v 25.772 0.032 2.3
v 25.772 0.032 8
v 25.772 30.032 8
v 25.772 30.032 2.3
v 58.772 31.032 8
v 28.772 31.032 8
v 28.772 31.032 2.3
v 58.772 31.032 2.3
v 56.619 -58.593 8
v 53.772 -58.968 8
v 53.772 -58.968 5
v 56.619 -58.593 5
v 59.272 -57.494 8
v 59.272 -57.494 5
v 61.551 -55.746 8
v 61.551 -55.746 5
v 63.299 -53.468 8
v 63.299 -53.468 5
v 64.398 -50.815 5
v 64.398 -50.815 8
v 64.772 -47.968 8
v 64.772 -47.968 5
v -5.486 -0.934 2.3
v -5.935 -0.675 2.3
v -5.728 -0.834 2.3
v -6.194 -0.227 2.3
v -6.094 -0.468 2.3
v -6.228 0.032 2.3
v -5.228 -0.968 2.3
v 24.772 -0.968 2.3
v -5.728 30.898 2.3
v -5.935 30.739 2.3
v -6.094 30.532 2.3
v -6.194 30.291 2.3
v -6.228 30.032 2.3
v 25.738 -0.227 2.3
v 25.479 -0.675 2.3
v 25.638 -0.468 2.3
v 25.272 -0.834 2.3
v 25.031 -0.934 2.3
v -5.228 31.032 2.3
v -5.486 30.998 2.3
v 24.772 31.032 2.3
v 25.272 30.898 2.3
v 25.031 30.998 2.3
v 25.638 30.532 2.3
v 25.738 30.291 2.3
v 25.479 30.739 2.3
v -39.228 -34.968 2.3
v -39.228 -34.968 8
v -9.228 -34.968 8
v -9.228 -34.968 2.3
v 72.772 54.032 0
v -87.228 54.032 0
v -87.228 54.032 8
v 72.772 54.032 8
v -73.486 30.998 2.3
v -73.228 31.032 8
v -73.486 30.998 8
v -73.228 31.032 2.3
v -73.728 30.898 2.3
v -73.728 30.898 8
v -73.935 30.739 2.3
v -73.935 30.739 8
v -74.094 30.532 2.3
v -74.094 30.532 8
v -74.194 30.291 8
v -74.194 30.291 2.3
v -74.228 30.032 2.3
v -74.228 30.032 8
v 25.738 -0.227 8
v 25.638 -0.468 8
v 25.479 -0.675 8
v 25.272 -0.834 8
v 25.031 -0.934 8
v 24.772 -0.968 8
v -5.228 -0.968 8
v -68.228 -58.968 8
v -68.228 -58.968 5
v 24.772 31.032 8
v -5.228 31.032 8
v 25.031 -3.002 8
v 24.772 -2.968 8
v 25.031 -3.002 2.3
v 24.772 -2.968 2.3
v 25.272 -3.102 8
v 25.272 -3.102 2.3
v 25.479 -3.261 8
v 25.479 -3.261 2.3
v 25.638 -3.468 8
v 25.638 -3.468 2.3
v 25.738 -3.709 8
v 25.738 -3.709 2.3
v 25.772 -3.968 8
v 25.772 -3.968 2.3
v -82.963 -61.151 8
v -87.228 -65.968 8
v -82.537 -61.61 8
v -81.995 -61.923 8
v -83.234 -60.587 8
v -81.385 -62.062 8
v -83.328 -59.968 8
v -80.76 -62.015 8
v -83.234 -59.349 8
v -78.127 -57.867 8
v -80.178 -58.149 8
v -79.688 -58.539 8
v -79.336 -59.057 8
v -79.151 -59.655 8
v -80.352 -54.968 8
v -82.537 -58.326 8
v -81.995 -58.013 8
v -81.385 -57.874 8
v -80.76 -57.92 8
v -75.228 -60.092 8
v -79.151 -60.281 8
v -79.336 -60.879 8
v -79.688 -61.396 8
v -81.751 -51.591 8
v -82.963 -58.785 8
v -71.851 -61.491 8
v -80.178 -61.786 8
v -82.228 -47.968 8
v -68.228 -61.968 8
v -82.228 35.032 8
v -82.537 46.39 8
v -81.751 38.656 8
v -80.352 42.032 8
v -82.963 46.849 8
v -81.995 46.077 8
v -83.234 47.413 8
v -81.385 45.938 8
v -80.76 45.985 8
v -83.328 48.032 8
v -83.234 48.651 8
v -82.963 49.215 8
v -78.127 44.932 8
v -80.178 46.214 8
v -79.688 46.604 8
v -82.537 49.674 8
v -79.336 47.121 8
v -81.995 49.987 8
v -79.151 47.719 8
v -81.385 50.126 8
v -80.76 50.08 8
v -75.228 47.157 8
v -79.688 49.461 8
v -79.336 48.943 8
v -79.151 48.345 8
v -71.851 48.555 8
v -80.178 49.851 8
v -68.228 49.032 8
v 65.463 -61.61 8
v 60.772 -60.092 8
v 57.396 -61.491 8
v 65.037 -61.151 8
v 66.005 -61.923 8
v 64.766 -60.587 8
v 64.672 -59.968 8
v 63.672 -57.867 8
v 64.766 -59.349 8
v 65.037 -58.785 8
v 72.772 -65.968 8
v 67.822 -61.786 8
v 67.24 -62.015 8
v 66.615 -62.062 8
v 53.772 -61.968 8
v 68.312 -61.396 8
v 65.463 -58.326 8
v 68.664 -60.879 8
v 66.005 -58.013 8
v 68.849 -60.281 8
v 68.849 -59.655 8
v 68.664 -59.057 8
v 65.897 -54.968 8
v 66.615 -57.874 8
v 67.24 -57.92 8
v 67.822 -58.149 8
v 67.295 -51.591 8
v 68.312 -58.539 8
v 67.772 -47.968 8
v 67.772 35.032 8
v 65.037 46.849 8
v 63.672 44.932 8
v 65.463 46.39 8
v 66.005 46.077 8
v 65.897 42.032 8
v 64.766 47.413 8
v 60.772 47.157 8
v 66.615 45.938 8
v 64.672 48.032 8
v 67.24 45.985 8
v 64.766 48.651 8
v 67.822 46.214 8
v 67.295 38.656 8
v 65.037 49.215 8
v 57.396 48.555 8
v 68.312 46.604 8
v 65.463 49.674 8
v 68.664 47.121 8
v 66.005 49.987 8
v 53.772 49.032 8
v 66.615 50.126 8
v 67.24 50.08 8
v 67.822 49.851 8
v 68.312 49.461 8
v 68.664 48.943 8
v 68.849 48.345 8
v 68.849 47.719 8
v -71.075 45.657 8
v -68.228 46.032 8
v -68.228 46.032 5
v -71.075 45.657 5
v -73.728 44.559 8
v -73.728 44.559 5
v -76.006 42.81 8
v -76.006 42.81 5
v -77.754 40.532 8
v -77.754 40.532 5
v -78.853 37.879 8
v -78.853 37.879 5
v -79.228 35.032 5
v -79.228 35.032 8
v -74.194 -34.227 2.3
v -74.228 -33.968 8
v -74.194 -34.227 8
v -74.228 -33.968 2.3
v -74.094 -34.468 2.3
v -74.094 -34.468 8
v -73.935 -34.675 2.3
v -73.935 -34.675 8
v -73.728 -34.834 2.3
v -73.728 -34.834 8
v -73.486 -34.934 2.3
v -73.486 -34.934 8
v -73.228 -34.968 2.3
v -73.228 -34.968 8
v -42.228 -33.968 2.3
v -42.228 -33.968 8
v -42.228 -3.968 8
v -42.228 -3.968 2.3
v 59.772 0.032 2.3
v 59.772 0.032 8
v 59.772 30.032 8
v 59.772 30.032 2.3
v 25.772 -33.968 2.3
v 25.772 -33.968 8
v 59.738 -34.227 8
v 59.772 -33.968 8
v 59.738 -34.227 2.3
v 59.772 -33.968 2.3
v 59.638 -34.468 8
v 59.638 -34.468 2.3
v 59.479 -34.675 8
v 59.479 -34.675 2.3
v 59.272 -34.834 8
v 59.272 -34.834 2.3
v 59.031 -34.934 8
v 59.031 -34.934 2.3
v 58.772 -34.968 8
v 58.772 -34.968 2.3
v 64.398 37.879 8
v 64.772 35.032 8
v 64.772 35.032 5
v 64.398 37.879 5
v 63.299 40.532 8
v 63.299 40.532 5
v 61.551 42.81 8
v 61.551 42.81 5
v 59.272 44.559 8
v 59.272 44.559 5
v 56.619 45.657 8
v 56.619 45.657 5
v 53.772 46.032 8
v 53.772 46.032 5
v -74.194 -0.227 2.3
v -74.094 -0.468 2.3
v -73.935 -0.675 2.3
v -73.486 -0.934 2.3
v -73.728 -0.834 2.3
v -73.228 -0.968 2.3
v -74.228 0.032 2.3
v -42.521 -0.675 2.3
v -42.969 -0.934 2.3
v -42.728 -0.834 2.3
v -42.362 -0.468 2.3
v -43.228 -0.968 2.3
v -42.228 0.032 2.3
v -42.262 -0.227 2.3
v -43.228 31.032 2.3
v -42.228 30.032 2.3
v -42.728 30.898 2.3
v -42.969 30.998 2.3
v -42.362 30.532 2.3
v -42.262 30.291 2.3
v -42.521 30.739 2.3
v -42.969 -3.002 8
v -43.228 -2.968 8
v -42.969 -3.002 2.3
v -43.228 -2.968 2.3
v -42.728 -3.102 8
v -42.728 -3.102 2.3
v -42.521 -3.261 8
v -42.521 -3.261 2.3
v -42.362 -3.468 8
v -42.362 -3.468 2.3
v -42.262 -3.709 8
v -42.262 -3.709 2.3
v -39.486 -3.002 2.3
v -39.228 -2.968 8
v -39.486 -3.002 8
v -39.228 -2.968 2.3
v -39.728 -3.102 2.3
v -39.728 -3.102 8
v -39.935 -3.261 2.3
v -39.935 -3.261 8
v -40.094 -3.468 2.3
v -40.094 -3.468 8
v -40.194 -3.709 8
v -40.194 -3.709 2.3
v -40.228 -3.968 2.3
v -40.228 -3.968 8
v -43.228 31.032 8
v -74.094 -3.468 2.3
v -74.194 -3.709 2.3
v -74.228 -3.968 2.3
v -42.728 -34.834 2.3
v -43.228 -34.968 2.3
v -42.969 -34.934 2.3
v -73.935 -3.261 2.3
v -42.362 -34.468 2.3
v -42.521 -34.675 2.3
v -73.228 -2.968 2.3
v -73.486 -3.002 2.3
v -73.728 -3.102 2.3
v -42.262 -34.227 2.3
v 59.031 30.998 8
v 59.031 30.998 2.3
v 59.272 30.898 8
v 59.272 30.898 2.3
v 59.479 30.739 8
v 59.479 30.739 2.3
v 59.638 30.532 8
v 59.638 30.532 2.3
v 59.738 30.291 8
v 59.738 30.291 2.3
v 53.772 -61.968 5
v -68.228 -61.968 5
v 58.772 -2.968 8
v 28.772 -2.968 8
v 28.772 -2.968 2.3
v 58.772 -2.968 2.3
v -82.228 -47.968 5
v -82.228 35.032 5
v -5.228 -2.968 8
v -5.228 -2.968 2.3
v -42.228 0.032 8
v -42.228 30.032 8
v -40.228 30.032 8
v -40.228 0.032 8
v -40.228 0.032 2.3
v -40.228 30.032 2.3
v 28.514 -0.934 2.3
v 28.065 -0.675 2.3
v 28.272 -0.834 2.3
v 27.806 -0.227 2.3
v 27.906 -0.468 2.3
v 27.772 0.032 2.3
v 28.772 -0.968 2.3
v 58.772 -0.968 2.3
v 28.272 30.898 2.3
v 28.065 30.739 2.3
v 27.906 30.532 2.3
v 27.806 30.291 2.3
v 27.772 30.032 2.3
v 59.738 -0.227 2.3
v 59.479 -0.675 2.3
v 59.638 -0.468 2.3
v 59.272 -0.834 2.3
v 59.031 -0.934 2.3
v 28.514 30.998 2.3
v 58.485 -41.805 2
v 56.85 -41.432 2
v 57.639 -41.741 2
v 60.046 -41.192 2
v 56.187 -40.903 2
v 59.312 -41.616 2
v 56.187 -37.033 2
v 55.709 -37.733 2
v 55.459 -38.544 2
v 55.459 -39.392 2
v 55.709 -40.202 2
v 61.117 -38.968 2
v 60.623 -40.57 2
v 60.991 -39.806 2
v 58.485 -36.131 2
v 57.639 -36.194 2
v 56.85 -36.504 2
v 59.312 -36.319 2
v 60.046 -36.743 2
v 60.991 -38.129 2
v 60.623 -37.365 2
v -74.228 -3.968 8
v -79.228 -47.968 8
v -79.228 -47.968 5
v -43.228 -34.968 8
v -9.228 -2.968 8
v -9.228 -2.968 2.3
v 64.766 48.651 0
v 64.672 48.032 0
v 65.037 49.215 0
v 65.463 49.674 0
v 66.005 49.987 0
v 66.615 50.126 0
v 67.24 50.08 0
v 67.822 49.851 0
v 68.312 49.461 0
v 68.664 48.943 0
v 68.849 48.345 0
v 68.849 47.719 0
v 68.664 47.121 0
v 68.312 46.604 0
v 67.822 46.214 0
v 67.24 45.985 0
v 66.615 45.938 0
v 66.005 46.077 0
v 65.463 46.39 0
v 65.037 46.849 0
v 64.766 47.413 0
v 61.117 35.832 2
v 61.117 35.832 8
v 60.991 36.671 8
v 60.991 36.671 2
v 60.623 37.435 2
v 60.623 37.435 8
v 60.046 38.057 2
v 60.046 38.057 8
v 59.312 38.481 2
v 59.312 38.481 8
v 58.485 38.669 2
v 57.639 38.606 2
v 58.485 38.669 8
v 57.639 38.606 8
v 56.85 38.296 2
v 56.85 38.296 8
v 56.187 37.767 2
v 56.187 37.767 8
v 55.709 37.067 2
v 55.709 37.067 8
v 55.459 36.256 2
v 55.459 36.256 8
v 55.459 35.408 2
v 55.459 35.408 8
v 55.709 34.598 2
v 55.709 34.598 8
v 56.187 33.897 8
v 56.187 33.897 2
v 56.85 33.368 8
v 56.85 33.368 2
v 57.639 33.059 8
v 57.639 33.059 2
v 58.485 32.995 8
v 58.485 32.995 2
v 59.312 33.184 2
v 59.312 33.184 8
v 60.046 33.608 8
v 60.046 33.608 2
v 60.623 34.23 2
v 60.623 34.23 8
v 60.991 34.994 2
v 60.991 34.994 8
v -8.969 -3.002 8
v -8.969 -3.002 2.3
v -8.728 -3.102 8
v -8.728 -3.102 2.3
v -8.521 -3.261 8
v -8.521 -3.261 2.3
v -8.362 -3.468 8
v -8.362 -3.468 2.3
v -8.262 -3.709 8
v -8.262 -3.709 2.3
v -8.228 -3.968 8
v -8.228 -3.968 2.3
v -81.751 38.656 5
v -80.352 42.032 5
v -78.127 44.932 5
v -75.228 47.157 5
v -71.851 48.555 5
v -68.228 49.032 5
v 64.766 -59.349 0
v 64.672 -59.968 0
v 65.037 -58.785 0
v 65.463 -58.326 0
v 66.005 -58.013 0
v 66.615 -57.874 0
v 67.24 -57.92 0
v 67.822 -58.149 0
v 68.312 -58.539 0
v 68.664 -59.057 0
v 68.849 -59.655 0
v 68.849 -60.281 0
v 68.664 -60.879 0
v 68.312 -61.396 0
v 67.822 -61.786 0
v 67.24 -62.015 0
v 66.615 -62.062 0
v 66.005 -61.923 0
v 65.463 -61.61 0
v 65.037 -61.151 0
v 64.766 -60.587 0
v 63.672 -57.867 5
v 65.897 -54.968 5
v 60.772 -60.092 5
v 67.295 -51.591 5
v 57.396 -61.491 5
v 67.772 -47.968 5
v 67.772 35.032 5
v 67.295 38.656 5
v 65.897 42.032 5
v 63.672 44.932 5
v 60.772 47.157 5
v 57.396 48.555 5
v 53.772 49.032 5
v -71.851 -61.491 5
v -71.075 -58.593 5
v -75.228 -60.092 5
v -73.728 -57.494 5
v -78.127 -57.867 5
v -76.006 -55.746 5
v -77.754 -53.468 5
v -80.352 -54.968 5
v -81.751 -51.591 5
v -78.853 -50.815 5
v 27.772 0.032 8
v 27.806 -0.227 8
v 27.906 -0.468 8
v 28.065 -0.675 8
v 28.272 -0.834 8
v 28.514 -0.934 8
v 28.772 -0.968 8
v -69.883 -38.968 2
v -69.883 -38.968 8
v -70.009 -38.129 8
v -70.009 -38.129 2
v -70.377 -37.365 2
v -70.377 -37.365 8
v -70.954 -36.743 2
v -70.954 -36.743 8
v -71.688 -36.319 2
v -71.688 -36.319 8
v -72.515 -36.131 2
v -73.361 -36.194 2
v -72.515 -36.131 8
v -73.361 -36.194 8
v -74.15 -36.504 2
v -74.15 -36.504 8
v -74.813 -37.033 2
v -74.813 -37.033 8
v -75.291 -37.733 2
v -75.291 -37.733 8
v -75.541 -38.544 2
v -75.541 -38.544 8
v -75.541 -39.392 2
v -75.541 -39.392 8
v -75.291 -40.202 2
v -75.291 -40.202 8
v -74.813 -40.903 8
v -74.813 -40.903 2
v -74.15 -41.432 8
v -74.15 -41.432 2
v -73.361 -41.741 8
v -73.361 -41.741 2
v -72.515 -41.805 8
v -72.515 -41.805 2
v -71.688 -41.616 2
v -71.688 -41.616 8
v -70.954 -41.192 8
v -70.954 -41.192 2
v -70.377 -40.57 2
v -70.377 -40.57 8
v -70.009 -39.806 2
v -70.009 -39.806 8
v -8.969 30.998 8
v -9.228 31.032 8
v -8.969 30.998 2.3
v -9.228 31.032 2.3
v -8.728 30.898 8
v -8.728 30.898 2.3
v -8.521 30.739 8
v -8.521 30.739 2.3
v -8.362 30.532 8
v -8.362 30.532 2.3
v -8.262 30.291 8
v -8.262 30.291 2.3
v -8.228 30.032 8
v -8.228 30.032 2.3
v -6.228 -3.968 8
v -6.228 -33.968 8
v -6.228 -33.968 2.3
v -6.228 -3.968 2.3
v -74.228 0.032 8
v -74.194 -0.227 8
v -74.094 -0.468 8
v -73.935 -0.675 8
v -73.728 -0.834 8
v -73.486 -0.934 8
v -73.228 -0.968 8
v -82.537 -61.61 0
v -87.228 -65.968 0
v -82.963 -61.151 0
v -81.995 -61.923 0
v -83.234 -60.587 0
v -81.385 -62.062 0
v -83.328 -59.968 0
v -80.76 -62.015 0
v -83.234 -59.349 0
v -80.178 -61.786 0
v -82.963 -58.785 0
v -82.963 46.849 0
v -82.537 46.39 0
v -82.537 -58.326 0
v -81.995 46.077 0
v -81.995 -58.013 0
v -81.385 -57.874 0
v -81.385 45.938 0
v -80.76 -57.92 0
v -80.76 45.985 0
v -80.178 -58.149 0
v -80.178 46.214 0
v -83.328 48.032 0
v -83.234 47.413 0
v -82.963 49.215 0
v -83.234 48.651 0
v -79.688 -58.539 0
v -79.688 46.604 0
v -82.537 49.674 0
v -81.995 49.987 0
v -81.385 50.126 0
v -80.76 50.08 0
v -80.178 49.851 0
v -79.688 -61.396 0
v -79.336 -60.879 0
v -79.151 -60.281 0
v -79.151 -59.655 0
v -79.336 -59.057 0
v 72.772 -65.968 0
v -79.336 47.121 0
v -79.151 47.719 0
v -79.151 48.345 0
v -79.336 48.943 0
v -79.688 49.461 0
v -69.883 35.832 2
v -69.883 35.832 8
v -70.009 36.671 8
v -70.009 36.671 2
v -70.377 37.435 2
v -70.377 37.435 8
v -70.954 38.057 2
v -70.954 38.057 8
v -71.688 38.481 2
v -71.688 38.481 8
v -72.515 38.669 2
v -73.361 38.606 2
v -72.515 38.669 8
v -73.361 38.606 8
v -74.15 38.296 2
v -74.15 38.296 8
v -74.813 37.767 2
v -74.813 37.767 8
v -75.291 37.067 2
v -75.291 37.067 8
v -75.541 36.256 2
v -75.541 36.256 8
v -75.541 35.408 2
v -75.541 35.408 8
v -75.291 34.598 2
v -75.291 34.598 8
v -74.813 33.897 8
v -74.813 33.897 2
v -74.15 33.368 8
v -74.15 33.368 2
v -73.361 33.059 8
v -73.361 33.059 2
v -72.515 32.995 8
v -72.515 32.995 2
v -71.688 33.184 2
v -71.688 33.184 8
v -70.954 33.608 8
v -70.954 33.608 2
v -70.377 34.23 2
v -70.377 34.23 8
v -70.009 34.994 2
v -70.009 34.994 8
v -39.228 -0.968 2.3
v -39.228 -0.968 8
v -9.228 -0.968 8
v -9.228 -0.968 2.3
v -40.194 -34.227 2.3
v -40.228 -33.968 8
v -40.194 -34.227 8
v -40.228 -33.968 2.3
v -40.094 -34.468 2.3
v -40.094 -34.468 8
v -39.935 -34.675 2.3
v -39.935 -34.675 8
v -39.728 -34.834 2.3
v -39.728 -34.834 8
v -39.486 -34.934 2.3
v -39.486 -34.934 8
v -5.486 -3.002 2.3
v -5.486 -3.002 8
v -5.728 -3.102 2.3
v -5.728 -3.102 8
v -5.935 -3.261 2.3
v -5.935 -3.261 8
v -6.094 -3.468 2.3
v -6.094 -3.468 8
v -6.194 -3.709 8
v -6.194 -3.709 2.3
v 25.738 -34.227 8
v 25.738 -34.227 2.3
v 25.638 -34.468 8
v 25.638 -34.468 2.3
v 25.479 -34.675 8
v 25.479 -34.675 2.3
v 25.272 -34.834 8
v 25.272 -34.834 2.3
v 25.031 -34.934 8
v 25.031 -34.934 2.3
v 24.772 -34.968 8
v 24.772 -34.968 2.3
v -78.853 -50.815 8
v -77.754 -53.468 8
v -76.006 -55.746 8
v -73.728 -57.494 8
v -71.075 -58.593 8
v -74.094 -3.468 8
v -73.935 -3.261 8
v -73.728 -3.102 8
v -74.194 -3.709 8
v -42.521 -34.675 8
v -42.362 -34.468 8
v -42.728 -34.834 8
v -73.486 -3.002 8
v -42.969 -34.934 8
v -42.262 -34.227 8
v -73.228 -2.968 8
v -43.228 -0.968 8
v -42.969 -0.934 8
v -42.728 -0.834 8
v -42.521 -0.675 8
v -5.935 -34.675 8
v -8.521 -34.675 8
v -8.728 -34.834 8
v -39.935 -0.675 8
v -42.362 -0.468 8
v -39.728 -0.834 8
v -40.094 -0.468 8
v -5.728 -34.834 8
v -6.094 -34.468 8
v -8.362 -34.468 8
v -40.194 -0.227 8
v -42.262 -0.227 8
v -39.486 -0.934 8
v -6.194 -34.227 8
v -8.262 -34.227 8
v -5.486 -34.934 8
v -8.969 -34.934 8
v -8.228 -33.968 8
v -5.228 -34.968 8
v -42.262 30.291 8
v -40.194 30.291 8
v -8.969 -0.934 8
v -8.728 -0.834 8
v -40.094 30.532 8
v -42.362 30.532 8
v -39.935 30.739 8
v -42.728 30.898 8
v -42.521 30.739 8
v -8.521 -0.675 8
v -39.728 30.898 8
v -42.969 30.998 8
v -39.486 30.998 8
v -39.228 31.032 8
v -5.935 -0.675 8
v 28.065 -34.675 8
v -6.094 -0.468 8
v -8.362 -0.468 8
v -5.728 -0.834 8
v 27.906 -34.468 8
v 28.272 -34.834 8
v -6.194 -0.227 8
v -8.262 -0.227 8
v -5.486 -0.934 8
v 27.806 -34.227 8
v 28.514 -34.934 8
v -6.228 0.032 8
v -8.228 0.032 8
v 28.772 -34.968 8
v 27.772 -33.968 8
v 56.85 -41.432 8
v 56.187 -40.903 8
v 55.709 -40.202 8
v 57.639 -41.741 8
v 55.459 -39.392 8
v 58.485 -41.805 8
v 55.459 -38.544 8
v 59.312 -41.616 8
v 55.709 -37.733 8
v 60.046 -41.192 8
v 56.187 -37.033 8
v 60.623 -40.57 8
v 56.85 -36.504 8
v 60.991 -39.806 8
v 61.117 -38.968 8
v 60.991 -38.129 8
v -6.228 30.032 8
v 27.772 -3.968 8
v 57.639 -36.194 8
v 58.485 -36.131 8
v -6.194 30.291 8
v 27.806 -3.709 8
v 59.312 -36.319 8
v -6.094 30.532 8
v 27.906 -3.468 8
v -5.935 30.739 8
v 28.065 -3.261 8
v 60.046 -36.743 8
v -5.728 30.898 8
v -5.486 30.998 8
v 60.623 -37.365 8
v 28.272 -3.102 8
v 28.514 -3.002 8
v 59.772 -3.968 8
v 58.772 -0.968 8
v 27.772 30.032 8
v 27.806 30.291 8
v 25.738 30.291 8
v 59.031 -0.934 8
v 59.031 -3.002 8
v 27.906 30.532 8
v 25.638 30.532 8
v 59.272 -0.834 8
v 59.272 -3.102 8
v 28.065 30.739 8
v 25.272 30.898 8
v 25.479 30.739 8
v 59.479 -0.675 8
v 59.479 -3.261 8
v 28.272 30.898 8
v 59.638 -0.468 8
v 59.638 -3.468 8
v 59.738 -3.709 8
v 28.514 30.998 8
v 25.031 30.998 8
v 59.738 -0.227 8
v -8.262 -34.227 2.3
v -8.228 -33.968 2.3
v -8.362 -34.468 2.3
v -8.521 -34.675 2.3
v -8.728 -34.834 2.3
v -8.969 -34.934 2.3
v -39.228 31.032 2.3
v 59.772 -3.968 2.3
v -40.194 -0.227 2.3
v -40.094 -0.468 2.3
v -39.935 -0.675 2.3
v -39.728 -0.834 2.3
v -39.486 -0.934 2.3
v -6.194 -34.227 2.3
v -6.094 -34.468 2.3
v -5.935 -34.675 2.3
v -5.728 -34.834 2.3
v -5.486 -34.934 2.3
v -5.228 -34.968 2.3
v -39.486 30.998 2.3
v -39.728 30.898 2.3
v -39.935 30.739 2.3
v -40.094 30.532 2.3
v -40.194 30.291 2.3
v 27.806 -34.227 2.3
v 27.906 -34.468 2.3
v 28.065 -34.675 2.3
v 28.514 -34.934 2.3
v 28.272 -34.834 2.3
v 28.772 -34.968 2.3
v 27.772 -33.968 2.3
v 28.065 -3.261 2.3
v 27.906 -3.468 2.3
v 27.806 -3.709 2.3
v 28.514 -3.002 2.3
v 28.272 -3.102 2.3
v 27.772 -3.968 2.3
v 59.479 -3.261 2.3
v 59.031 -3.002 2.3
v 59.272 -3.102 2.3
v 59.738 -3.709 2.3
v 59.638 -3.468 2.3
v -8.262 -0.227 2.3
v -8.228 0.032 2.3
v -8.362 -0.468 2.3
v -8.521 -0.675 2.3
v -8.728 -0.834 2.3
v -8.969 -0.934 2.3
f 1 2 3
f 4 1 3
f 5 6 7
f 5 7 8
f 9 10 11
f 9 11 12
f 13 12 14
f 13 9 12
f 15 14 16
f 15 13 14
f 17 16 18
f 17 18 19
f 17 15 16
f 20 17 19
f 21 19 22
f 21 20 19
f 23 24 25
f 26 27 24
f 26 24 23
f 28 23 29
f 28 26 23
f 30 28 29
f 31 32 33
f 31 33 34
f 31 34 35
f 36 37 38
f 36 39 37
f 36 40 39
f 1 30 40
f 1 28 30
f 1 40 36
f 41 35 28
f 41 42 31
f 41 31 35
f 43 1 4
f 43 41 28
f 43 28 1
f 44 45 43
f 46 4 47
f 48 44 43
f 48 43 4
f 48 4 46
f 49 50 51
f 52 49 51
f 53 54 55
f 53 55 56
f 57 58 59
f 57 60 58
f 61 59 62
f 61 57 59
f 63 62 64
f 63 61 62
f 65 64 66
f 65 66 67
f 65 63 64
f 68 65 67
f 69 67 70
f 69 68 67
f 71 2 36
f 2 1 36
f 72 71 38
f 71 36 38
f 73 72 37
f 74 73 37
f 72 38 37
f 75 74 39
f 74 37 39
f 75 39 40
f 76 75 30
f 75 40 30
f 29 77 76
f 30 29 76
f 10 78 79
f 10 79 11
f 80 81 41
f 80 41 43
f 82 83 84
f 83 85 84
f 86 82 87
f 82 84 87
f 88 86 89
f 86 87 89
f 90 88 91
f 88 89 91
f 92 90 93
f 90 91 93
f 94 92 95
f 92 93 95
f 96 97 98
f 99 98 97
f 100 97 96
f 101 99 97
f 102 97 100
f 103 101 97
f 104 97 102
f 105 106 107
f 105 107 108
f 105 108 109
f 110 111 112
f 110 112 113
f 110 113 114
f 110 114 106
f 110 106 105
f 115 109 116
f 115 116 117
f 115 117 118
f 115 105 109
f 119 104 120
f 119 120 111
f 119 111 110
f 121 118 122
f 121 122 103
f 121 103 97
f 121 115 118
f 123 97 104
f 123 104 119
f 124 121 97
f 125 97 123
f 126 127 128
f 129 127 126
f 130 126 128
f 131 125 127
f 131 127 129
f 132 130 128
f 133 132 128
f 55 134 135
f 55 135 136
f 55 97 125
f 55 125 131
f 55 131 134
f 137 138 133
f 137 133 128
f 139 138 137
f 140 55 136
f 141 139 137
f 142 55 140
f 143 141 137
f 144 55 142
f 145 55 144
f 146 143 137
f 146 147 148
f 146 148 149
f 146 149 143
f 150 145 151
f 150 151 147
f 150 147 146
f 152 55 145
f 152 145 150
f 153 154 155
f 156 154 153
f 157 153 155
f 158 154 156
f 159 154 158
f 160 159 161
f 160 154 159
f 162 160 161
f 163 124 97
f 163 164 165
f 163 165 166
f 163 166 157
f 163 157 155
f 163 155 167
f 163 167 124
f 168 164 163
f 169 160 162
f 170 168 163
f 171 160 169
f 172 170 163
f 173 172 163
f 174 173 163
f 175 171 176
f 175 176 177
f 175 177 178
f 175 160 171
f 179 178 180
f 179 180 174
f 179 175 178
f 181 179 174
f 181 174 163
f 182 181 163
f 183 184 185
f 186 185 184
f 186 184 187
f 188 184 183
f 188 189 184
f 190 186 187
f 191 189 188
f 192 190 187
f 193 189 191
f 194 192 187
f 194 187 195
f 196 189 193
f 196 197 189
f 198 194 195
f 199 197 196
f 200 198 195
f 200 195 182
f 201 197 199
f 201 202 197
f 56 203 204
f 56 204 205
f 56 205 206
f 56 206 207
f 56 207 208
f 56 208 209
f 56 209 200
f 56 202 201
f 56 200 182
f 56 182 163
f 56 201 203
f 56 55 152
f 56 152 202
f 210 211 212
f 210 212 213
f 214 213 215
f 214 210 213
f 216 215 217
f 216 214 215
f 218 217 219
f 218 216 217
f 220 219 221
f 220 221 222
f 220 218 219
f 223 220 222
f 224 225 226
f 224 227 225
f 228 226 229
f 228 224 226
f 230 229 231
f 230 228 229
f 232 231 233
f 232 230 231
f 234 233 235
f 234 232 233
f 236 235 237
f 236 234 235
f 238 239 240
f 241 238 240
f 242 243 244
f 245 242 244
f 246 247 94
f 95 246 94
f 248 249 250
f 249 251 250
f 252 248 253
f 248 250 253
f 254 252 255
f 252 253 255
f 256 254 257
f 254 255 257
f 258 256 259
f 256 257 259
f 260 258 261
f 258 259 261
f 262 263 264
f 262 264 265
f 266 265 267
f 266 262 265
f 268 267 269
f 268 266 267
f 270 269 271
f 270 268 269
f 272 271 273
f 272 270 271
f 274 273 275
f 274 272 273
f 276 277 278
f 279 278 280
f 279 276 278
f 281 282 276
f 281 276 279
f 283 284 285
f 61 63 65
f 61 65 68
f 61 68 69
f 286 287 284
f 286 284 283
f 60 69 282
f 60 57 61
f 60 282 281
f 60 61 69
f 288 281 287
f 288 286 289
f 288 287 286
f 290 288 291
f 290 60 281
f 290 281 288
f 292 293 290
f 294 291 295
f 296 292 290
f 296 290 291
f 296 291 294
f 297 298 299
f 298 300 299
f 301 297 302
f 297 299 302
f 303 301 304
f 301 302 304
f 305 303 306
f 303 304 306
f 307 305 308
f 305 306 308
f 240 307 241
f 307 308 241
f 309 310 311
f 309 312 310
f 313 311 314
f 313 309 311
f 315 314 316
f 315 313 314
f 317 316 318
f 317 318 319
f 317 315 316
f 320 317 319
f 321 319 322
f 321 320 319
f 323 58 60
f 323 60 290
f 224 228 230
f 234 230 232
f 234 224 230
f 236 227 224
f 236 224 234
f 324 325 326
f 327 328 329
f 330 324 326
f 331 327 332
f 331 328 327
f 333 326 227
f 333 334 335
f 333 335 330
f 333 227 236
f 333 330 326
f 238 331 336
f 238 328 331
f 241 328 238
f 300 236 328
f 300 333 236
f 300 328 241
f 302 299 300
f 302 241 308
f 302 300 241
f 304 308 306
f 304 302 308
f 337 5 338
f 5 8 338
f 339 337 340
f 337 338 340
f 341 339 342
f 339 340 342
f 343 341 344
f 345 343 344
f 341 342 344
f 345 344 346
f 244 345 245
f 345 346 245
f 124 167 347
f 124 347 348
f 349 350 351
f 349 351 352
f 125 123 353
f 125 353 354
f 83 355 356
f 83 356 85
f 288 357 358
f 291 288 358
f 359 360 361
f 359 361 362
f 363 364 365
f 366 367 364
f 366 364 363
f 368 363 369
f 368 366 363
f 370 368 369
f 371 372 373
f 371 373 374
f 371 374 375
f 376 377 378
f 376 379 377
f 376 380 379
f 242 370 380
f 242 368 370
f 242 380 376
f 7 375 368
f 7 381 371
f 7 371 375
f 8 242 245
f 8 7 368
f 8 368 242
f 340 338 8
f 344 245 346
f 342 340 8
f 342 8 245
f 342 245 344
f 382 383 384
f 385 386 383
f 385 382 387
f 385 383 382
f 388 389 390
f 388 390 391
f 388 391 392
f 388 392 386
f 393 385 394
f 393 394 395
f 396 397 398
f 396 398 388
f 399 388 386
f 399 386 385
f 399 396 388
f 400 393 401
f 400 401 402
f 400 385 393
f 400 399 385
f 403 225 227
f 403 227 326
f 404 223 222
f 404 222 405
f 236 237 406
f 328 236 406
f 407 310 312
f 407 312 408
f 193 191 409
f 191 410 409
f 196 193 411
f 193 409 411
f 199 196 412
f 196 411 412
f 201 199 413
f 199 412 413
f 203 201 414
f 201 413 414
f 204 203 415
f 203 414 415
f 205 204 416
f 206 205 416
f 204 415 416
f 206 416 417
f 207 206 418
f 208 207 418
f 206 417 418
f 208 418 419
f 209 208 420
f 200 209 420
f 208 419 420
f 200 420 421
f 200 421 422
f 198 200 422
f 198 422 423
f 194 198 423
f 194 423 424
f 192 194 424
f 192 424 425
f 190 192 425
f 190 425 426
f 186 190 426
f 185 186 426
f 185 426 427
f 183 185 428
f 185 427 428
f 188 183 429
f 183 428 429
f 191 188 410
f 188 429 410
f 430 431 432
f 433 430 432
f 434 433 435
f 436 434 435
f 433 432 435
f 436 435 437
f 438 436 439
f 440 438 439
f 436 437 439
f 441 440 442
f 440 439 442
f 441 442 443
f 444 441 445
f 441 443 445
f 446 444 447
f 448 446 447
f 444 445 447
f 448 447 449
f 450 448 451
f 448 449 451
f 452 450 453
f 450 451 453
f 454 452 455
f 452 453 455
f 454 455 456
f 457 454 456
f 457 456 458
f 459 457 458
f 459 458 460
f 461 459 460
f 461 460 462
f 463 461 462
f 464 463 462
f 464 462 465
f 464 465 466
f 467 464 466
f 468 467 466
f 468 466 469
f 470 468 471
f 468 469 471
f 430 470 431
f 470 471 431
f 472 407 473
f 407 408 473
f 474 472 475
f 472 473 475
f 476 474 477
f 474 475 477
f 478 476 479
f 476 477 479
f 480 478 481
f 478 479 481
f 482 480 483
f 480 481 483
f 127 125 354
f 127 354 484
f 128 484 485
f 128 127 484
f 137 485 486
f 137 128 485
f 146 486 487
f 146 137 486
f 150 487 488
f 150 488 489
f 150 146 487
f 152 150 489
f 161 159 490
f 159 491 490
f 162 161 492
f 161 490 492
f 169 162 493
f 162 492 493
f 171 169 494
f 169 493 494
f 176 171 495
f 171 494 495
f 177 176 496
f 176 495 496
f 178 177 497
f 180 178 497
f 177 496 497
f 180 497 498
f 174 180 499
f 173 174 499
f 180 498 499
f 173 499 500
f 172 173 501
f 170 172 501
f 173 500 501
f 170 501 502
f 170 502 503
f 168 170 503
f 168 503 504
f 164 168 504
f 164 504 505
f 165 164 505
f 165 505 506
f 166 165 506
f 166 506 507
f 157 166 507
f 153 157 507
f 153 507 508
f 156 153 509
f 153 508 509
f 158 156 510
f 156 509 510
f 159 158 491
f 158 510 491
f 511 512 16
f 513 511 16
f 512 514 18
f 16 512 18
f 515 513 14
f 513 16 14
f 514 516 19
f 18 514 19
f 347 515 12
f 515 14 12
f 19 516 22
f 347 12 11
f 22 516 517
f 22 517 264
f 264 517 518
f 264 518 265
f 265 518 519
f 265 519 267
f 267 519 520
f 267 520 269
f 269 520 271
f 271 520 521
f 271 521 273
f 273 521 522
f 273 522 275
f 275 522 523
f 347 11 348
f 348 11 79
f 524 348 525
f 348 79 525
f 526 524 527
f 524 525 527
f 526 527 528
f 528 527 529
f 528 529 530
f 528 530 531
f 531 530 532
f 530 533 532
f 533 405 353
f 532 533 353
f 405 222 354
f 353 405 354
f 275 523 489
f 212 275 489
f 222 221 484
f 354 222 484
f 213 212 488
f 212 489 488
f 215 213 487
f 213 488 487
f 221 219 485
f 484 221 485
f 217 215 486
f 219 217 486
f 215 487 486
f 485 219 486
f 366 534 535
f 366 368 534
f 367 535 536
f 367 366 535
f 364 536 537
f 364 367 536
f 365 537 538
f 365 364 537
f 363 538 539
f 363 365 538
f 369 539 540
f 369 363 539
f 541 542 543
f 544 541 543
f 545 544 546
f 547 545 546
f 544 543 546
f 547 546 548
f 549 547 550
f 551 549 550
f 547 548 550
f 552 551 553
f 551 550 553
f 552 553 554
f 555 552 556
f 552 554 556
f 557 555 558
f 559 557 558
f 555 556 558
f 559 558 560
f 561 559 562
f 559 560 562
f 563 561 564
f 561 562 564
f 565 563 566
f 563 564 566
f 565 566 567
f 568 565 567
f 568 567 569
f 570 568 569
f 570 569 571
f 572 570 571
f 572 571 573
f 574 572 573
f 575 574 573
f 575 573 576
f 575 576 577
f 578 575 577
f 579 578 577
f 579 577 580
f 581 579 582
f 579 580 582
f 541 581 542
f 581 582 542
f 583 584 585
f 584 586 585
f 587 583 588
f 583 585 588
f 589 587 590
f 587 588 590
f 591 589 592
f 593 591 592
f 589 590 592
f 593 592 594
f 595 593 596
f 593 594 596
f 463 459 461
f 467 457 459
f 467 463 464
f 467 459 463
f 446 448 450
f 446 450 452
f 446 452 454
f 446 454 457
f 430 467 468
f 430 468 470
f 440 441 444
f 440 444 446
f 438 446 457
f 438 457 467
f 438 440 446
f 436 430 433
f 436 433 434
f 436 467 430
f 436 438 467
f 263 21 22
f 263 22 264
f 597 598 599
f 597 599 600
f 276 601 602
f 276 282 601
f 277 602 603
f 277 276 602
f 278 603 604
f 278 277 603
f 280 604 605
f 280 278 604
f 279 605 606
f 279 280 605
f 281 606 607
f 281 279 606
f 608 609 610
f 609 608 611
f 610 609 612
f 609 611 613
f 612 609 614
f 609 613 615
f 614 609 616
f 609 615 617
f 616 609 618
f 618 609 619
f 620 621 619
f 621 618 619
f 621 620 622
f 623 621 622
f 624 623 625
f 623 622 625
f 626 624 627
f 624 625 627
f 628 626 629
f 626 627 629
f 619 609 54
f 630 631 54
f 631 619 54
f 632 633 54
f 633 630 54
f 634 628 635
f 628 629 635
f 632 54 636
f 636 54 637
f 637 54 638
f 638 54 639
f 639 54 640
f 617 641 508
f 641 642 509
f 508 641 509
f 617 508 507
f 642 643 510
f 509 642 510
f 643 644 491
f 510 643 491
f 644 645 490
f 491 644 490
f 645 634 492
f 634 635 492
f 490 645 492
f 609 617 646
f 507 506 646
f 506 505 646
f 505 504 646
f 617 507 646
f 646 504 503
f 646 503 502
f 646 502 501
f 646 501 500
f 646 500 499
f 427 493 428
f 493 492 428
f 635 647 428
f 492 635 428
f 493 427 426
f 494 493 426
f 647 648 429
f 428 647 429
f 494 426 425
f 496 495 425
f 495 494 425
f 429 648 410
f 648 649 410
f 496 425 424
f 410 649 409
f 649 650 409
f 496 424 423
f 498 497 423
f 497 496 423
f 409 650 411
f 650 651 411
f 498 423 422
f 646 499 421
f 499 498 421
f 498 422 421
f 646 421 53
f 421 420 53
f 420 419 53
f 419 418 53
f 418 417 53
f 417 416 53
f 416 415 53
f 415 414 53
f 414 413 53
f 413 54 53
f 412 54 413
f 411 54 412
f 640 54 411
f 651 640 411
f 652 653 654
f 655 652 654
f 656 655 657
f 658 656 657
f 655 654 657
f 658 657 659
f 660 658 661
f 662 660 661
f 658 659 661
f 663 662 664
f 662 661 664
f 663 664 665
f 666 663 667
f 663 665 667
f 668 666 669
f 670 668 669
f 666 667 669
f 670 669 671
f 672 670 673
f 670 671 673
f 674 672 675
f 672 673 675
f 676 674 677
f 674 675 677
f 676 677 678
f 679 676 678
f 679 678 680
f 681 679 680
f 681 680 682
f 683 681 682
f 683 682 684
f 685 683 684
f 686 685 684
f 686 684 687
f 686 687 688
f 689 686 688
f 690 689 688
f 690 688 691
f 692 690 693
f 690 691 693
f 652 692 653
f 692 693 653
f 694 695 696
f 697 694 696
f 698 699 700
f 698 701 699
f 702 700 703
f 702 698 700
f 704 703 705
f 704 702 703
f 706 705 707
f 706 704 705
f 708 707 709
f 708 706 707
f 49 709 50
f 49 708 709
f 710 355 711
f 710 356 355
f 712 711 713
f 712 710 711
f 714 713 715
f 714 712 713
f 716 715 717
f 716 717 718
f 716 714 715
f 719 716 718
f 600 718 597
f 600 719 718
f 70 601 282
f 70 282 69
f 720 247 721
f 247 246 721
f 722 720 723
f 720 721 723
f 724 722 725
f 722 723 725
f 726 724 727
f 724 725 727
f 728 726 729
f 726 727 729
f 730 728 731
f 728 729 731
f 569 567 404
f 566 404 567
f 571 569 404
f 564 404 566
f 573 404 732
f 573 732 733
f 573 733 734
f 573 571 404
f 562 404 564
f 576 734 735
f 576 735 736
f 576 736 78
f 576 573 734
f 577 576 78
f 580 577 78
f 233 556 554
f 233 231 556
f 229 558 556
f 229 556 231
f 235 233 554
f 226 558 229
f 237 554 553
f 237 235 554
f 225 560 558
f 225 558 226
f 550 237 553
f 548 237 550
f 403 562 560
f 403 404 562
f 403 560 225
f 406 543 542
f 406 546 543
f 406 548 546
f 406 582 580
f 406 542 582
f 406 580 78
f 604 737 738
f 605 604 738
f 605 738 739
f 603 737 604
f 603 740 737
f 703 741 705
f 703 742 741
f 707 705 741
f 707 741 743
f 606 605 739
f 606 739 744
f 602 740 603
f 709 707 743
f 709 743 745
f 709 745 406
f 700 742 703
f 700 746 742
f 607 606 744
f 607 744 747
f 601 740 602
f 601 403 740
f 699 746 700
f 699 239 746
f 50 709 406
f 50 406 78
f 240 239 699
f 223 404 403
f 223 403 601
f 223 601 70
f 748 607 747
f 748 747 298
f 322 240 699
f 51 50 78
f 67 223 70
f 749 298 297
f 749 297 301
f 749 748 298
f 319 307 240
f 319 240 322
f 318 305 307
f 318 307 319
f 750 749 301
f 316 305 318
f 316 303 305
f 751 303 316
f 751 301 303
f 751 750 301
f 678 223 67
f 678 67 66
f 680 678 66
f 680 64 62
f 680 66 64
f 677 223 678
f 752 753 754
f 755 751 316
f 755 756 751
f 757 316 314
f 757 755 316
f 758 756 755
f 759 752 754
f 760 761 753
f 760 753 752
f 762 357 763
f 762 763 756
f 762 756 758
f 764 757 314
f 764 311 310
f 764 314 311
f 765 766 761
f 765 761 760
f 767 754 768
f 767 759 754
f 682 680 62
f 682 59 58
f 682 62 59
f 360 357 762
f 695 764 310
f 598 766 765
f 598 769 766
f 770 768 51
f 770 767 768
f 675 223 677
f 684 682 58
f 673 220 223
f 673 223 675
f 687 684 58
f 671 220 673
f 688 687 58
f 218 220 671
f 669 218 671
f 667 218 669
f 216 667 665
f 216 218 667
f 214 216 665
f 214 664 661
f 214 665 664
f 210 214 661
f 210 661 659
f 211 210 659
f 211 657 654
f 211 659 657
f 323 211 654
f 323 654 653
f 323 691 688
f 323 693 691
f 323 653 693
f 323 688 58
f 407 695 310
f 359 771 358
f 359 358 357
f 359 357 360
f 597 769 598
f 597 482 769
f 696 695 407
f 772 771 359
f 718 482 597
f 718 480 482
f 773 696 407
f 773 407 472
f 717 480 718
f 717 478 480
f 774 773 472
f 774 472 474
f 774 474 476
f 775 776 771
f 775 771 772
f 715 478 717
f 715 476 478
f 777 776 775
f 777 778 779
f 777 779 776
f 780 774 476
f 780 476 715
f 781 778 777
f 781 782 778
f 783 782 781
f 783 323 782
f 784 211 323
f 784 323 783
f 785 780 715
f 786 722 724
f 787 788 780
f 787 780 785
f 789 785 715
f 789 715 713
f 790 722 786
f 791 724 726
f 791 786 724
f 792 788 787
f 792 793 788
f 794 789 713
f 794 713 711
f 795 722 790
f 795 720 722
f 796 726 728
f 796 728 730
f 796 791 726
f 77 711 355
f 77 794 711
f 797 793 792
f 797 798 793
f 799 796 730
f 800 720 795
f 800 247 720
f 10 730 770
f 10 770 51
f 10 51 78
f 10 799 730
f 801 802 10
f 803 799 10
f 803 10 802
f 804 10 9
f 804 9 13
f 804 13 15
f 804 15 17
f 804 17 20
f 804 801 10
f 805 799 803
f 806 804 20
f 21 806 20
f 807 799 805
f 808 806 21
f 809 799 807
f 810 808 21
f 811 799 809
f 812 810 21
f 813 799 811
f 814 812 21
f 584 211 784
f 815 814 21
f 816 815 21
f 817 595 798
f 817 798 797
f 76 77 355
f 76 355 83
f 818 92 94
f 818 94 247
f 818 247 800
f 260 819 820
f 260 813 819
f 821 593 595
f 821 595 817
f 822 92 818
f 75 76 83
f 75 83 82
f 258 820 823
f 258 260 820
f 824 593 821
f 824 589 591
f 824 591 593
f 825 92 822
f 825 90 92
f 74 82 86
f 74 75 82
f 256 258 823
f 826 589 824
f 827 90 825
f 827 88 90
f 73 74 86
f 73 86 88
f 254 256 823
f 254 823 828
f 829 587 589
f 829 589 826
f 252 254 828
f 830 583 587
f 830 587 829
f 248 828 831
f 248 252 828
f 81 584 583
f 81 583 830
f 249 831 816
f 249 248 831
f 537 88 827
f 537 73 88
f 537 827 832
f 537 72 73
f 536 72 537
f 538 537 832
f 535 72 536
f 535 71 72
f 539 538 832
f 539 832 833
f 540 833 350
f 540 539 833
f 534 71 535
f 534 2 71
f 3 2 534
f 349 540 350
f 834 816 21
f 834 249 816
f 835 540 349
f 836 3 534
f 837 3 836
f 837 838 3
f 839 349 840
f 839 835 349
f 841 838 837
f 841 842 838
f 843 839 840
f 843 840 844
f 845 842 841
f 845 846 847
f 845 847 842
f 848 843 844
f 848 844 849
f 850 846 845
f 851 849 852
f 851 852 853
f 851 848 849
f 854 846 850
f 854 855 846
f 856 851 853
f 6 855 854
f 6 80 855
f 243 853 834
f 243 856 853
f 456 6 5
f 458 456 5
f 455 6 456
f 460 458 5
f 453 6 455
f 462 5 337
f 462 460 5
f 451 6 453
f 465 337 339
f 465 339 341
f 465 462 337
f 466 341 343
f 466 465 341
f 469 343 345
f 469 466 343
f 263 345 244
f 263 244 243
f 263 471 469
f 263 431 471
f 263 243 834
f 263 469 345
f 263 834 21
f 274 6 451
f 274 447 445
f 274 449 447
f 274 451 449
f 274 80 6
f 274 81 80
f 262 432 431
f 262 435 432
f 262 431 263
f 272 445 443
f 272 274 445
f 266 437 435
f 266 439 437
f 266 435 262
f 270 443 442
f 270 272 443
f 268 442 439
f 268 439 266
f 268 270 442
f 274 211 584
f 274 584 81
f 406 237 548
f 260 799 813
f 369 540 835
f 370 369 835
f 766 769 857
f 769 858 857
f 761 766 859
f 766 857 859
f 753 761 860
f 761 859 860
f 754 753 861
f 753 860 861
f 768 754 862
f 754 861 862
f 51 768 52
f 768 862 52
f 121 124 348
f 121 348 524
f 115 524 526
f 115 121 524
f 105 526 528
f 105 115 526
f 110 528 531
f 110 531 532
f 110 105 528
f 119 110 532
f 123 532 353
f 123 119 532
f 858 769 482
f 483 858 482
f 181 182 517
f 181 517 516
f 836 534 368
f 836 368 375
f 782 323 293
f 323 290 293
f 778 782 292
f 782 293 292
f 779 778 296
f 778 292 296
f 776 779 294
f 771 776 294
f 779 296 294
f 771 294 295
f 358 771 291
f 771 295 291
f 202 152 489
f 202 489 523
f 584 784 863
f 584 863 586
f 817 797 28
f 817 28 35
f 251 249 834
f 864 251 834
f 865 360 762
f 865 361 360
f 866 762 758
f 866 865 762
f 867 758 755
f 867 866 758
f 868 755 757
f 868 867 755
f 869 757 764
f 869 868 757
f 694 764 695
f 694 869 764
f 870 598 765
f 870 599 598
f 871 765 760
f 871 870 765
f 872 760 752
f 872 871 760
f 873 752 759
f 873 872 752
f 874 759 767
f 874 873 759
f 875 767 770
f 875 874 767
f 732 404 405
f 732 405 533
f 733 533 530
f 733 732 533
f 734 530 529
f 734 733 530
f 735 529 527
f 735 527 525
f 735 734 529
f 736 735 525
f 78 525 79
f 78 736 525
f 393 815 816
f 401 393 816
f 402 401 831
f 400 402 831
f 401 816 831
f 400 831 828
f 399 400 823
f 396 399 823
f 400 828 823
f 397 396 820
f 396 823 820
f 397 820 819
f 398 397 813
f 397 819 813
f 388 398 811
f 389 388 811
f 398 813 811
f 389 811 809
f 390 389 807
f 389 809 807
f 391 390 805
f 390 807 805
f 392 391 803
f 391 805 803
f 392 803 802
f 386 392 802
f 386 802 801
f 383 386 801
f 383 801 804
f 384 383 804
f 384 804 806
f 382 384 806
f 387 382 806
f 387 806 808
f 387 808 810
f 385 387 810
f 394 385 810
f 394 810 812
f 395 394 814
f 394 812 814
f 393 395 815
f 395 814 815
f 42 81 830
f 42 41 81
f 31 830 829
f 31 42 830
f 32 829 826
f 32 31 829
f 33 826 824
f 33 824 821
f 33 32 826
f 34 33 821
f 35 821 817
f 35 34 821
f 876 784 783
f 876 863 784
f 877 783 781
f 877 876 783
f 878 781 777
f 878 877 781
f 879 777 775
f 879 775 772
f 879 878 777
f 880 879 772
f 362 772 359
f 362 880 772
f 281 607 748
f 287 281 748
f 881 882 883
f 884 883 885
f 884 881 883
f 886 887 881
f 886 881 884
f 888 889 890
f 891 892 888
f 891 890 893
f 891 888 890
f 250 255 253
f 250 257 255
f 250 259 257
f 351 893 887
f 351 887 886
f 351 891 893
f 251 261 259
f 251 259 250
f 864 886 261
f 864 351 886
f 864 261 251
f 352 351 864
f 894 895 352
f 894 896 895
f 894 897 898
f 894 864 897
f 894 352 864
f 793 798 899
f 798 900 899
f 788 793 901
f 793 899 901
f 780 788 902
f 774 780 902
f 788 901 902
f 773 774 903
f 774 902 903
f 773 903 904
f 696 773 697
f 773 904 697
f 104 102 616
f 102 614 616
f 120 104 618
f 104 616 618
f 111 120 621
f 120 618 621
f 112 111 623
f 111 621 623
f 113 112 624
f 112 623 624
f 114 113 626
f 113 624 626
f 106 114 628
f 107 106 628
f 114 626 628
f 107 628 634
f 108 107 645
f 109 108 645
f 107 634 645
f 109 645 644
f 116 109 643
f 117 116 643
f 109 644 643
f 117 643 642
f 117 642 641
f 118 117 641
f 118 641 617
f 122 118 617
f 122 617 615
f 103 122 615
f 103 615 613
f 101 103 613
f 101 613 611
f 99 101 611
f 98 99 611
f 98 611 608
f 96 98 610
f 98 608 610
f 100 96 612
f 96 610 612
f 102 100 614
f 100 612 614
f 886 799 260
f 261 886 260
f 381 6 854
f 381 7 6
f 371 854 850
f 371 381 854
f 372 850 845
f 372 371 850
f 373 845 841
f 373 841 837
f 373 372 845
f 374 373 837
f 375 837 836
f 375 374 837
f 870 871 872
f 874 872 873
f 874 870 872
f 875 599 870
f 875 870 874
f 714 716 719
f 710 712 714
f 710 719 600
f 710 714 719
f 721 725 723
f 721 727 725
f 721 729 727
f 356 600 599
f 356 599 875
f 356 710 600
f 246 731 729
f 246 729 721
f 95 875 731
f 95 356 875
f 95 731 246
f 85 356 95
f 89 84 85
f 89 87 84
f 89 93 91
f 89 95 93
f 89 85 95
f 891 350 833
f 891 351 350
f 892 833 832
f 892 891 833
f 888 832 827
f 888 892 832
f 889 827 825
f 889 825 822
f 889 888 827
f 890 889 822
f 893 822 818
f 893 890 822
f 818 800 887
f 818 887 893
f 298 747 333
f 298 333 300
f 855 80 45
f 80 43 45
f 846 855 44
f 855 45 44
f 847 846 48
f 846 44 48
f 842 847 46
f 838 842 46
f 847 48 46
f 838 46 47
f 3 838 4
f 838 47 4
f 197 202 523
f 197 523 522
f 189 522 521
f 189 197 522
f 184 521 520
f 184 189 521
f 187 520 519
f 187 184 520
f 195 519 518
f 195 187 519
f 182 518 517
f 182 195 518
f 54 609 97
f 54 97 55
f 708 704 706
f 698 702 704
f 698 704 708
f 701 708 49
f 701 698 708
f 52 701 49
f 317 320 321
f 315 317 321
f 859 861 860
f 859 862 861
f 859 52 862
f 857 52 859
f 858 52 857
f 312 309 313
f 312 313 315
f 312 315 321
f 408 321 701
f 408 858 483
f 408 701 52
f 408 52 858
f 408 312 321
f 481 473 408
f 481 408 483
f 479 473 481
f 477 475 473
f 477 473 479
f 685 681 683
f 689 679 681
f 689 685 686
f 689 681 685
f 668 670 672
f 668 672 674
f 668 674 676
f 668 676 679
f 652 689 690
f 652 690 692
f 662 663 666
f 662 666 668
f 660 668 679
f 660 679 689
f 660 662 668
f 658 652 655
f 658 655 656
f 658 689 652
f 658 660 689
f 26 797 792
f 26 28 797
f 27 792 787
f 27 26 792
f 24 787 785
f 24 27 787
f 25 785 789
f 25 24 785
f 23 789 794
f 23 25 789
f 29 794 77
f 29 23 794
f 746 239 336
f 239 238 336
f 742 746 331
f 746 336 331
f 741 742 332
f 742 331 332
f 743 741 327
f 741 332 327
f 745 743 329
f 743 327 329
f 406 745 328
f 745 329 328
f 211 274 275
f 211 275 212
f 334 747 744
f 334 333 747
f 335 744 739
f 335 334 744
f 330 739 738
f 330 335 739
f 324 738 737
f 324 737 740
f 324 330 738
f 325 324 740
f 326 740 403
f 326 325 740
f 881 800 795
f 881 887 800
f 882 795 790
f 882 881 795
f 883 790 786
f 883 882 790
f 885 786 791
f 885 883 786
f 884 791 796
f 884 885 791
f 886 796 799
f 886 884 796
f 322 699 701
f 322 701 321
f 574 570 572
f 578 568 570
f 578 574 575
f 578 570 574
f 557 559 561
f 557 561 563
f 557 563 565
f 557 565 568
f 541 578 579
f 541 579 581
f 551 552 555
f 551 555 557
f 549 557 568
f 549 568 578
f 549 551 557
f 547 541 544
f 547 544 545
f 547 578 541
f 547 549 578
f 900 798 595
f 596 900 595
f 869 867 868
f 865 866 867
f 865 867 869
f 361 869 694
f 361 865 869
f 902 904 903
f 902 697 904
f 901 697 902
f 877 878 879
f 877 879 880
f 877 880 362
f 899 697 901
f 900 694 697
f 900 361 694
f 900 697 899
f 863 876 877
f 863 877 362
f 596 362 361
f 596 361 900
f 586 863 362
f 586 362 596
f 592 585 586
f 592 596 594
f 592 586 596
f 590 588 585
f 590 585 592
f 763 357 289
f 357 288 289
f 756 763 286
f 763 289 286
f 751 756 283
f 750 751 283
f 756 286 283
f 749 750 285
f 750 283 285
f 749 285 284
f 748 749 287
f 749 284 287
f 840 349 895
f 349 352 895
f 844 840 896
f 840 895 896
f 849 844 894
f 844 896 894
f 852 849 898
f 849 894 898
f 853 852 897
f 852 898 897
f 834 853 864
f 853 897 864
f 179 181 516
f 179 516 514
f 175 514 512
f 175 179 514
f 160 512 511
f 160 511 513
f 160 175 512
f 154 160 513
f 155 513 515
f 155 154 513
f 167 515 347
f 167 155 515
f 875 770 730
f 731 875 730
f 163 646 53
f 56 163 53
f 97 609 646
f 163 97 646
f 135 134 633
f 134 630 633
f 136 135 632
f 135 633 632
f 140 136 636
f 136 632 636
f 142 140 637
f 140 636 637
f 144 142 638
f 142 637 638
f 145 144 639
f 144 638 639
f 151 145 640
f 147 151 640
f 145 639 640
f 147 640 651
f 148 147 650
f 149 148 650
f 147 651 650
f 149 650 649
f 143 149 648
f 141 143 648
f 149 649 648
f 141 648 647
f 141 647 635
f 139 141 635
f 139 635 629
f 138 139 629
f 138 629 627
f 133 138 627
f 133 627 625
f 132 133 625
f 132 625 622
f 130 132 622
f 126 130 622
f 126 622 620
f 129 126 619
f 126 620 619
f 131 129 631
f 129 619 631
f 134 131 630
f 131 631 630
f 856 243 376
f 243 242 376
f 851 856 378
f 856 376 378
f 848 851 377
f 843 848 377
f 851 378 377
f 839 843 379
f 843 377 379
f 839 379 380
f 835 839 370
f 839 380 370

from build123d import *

# Parameters (mm, degrees)
ESQUISSE1_W                                   = 160
ESQUISSE1_H                                   = 120
BOSS_EXTRU_1_DEPTH                            = 8
ESQUISSE2_W                                   = 32
ESQUISSE2_H                                   = 32
ENL_V_MAT_EXTRU_1_DEPTH                       = 5.7
ENL_V_MAT_EXTRU_2_DEPTH                       = 3
TROU_POUR_TARAUDAGE_POUR_TROU_TARAUD_M5_D     = 4.2
TROU_POUR_TARAUDAGE_POUR_TROU_TARAUD_M5_DEPTH = 8
TROU_POUR_TARAUDAGE_POUR_TROU_TARAUD_M5_TIP   = 1.2618073
CONG_1_R                                      = 1
ESQUISSE7_R                                   = 2.845
ENL_V_MAT_EXTRU_3_DEPTH                       = 6


with BuildPart() as part:
    # Esquisse1 → Boss.-Extru.1 (new body)
    with BuildSketch(Plane.XY):
        with Locations((-7.227655867, -5.967741935)):
            Rectangle(ESQUISSE1_W, ESQUISSE1_H)
    extrude(amount=BOSS_EXTRU_1_DEPTH)

    # Esquisse2 → Enlèv. mat.-Extru.1 (cut)
    with BuildSketch(Plane.XY.offset(8)):
        with Locations((-24.227655867, 15.032258065)):
            Rectangle(ESQUISSE2_W, ESQUISSE2_H)
        with Locations((-58.227655867, 15.032258065)):
            Rectangle(ESQUISSE2_W, ESQUISSE2_H)
        with Locations((9.772344133, 15.032258065)):
            Rectangle(ESQUISSE2_W, ESQUISSE2_H)
        with Locations((43.772344133, 15.032258065)):
            Rectangle(ESQUISSE2_W, ESQUISSE2_H)
        with Locations((-24.227655867, -18.967741935)):
            Rectangle(ESQUISSE2_W, ESQUISSE2_H)
        with Locations((9.772344133, -18.967741935)):
            Rectangle(ESQUISSE2_W, ESQUISSE2_H)
        with Locations((43.772344133, -18.967741935)):
            Rectangle(ESQUISSE2_W, ESQUISSE2_H)
        with Locations((-58.227655867, -18.967741935)):
            Rectangle(ESQUISSE2_W, ESQUISSE2_H)
    extrude(amount=-ENL_V_MAT_EXTRU_1_DEPTH, mode=Mode.SUBTRACT)

    # Esquisse3 → Enlèv. mat.-Extru.2 (cut)
    with BuildSketch(Plane.XY.offset(8)):
        with BuildLine():
            Line((-68.227655867, 49.032258065), (53.772344133, 49.032258065))
            ThreePointArc((53.772344133, 49.032258065), (63.67183907, 44.931753001), (67.772344133, 35.032258065))
            Line((67.772344133, 35.032258065), (67.772344133, -47.967741935))
            ThreePointArc((67.772344133, -47.967741935), (63.67183907, -57.867236872), (53.772344133, -61.967741935))
            Line((53.772344133, -61.967741935), (-68.227655867, -61.967741935))
            ThreePointArc((-68.227655867, -61.967741935), (-78.127150803, -57.867236872), (-82.227655867, -47.967741935))
            Line((-82.227655867, -47.967741935), (-82.227655867, 35.032258065))
            ThreePointArc((-82.227655867, 35.032258065), (-78.127150803, 44.931753001), (-68.227655867, 49.032258065))
        make_face()
        with BuildLine():
            Line((-79.227655867, 35.032258065), (-79.227655867, -47.967741935))
            ThreePointArc((-79.227655867, -47.967741935), (-76.00583046, -55.745916529), (-68.227655867, -58.967741935))
            Line((-68.227655867, -58.967741935), (53.772344133, -58.967741935))
            ThreePointArc((53.772344133, -58.967741935), (61.550518726, -55.745916529), (64.772344133, -47.967741935))
            Line((64.772344133, -47.967741935), (64.772344133, 35.032258065))
            ThreePointArc((64.772344133, 35.032258065), (61.550518726, 42.810432658), (53.772344133, 46.032258065))
            Line((53.772344133, 46.032258065), (-68.227655867, 46.032258065))
            ThreePointArc((-68.227655867, 46.032258065), (-76.00583046, 42.810432658), (-79.227655867, 35.032258065))
        make_face(mode=Mode.SUBTRACT)
    extrude(amount=-ENL_V_MAT_EXTRU_2_DEPTH, mode=Mode.SUBTRACT)

    # Trou pour taraudage pour trou taraudé M51
    with Locations(Plane.XY.offset(8)):
        with Locations((-81.227655867, -59.967741935), (-81.227655867, 48.032258065), (66.772344133, 48.032258065), (66.772344133, -59.967741935)):
            Hole(TROU_POUR_TARAUDAGE_POUR_TROU_TARAUD_M5_D / 2, depth=TROU_POUR_TARAUDAGE_POUR_TROU_TARAUD_M5_DEPTH)
            with Locations((0, 0, -(TROU_POUR_TARAUDAGE_POUR_TROU_TARAUD_M5_DEPTH + TROU_POUR_TARAUDAGE_POUR_TROU_TARAUD_M5_TIP / 2))):  # 118° drill point
                Cone(0, TROU_POUR_TARAUDAGE_POUR_TROU_TARAUD_M5_D / 2, TROU_POUR_TARAUDAGE_POUR_TROU_TARAUD_M5_TIP, mode=Mode.SUBTRACT)

    # Congé1
    cong_1_edges = [part.edges().sort_by_distance(p)[0] for p in [
        (-74.227655867, -0.967741935, 5.15),
        (-74.227655867, 31.032258065, 5.15),
        (-42.227655867, 31.032258065, 5.15),
        (-42.227655867, -0.967741935, 5.15),
        (-40.227655867, -0.967741935, 5.15),
        (-40.227655867, 31.032258065, 5.15),
        (-8.227655867, 31.032258065, 5.15),
        (-8.227655867, -0.967741935, 5.15),
        (-6.227655867, -0.967741935, 5.15),
        (-6.227655867, 31.032258065, 5.15),
        (25.772344133, 31.032258065, 5.15),
        (25.772344133, -0.967741935, 5.15),
        (27.772344133, -0.967741935, 5.15),
        (27.772344133, 31.032258065, 5.15),
        (59.772344133, 31.032258065, 5.15),
        (59.772344133, -0.967741935, 5.15),
        (-74.227655867, -34.967741935, 5.15),
        (-74.227655867, -2.967741935, 5.15),
        (-42.227655867, -2.967741935, 5.15),
        (-42.227655867, -34.967741935, 5.15),
        (27.772344133, -34.967741935, 5.15),
        (27.772344133, -2.967741935, 5.15),
        (59.772344133, -2.967741935, 5.15),
        (59.772344133, -34.967741935, 5.15),
        (-6.227655867, -34.967741935, 5.15),
        (-6.227655867, -2.967741935, 5.15),
        (25.772344133, -2.967741935, 5.15),
        (25.772344133, -34.967741935, 5.15),
        (-40.227655867, -34.967741935, 5.15),
        (-40.227655867, -2.967741935, 5.15),
        (-8.227655867, -2.967741935, 5.15),
        (-8.227655867, -34.967741935, 5.15),
    ]]
    fillet(cong_1_edges, radius=CONG_1_R)

    # Esquisse7 → Enlèv. mat.-Extru.3 (cut)
    with BuildSketch(Plane.XY.offset(8)):
        with Locations((-72.727655867, 35.832258065)):
            Circle(ESQUISSE7_R)
        with Locations((-72.727655867, -38.967741935)):
            Circle(ESQUISSE7_R)
        with Locations((58.272344133, -38.967741935)):
            Circle(ESQUISSE7_R)
        with Locations((58.272344133, 35.832258065)):
            Circle(ESQUISSE7_R)
    extrude(amount=-ENL_V_MAT_EXTRU_3_DEPTH, mode=Mode.SUBTRACT)


solid = part.part
